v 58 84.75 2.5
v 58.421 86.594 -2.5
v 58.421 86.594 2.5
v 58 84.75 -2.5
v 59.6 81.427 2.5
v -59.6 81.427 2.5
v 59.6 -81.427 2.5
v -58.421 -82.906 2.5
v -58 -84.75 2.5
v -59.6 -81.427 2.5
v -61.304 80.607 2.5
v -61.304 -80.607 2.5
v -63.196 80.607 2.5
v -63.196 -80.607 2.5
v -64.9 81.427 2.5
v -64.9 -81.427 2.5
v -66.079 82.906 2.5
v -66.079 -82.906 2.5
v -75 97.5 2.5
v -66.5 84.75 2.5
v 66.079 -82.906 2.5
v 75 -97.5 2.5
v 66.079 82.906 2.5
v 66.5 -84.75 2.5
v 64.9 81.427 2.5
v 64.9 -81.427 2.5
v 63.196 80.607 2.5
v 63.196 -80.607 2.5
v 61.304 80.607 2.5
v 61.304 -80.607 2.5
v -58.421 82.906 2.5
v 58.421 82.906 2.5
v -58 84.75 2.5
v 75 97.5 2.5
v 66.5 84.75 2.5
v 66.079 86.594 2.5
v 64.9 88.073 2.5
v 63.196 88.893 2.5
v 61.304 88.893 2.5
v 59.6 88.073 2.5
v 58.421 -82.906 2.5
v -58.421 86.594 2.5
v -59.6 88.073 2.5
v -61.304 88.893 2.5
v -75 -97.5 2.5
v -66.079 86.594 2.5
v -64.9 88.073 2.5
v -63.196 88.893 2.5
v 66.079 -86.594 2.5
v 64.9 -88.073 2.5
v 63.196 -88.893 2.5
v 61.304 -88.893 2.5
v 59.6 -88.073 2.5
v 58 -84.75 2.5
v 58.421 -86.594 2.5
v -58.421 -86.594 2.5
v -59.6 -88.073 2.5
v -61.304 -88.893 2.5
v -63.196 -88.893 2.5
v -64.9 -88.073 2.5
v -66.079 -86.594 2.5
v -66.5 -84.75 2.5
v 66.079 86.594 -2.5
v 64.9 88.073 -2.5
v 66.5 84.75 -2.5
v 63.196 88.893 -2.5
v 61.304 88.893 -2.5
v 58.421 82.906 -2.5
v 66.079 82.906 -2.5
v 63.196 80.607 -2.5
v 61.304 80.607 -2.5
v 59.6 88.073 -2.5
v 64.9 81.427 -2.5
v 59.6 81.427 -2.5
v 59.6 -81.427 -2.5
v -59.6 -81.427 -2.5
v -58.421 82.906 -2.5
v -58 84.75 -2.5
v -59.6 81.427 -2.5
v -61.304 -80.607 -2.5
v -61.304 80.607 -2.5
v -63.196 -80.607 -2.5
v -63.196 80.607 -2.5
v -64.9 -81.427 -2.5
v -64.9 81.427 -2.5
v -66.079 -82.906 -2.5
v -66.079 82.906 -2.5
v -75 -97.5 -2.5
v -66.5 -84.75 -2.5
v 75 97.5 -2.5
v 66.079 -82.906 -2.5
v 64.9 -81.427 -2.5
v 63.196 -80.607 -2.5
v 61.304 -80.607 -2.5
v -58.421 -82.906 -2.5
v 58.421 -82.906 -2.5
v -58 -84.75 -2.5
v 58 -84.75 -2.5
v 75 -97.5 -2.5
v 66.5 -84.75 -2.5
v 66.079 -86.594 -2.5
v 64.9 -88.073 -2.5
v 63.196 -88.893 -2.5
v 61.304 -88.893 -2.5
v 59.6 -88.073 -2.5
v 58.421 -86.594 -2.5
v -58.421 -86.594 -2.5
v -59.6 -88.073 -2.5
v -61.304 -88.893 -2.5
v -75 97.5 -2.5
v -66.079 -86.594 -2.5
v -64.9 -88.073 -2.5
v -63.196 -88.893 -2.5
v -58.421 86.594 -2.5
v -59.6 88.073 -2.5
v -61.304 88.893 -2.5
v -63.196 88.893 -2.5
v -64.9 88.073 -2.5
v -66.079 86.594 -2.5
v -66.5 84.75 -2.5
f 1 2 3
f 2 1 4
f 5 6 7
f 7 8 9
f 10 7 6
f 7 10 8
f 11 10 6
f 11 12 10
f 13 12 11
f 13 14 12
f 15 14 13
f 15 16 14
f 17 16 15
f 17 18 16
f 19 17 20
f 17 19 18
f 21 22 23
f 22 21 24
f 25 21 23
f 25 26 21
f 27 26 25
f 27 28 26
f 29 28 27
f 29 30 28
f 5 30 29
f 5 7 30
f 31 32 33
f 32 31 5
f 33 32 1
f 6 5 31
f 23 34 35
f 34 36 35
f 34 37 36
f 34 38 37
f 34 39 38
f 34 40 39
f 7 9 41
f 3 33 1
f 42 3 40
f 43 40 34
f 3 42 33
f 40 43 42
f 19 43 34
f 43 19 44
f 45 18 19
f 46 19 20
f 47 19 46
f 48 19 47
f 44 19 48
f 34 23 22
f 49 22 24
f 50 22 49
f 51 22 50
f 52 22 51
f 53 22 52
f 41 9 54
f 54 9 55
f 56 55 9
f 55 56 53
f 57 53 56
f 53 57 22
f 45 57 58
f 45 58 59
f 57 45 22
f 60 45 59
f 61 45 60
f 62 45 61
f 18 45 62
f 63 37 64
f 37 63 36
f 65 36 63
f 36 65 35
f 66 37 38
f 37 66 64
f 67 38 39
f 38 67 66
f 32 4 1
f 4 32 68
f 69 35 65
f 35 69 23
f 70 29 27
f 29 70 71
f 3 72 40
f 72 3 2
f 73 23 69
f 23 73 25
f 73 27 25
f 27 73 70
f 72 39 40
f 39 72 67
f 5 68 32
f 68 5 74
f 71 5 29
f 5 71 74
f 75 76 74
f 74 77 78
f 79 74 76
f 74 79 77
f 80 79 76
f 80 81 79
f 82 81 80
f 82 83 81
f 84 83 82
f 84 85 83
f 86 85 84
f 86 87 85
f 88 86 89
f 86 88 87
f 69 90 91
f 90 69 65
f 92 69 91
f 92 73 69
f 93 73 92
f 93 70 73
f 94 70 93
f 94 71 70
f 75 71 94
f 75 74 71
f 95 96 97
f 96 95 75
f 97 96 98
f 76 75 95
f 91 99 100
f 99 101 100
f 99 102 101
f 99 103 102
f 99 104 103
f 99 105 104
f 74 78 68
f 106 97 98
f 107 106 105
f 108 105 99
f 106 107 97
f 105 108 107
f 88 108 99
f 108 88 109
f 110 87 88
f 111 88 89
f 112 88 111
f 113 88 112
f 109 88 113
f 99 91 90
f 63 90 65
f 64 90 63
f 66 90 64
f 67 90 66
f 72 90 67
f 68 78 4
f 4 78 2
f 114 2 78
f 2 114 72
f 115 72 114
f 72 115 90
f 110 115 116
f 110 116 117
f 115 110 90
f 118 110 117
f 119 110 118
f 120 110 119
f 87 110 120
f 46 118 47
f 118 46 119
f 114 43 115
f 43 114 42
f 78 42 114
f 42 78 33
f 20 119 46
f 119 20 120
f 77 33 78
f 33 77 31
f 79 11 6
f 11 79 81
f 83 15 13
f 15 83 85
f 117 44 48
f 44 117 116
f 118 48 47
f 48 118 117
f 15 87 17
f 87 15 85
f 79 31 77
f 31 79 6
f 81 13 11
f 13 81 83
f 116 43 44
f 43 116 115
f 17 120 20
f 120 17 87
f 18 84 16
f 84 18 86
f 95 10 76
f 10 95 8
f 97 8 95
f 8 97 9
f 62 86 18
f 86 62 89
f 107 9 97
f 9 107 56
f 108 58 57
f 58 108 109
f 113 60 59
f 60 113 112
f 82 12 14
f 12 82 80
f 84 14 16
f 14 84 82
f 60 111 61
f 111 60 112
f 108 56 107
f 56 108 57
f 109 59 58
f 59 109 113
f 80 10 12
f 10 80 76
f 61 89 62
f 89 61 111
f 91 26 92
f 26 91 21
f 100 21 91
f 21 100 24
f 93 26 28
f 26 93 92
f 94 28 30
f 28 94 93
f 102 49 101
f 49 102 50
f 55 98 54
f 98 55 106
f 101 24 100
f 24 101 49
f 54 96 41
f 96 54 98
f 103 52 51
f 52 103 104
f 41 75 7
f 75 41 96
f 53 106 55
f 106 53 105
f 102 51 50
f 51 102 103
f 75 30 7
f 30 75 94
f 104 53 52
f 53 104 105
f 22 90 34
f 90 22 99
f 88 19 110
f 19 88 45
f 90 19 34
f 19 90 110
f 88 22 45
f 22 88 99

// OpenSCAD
// Generated by SolidPython 1.1.3 on 2023-10-16 12:13:29


difference() {
	cube(center = true, size = [150, 195.0000000000, 5]);
	union() {
		translate(v = [62.2500000000, 84.7500000000]) {
			cylinder(center = true, h = 5, r = 4.2500000000);
		}
		translate(v = [-62.2500000000, 84.7500000000]) {
			cylinder(center = true, h = 5, r = 4.2500000000);
		}
		translate(v = [-62.2500000000, -84.7500000000]) {
			cylinder(center = true, h = 5, r = 4.2500000000);
		}
		translate(v = [62.2500000000, -84.7500000000]) {
			cylinder(center = true, h = 5, r = 4.2500000000);
		}
	}
}
/***********************************************
*********      SolidPython code:      **********
************************************************
 
import solid
import numbers
import pudb
from solid.utils import *
import viewscad
import subprocess
import os
import os.path as osp
import math
import sys

chamfer_extrude=solid.import_scad("./chamfer_extrude.scad")
chamfer_extrude=chamfer_extrude.chamfer_extrude
r = viewscad.Renderer(width=800, height=800)

def debug(model,f_name,path="/home/ts/code/projects/mfd/designs/debug"):
    solid.scad_render_to_file(model,osp.join(path,f_name)+".scad")
#generate position list of wells using offset from center
wells_pos_from_center_4 = lambda offset: [[-offset,offset],
                                        [offset, offset],
                                        [-offset, -offset],
                                        [offset, -offset]]
#wells_pos_from_center_2 = lambda offset: [[0,offset],
#                                        [0, -offset]]
wells_pos_from_center_2 = lambda offset: [[offset,0],
                                        [-offset,0]]

def make_well(dims,shape=None,height=None,dxf=False):
    def circle_cylinder():
        if dxf or (height is None):
            well = solid.circle(r=dims, segments=64)
        else:
            well = solid.cylinder(r=dims, h=height, segments=64, center = True)
        return well
    if dims is None:
        sys.exit("radius needs to be a number")
    if isinstance(dims, numbers.Number):
        well =circle_cylinder()
    elif len(dims)==1:
        if isinstance(dims[1], numbers.Number):
            well =circle_cylinder()
        else:
            sys.exit("radius needs to be a number")
    elif len(dims)==2:
        well = solid.square(dims,center = True)
    elif len(dims)==3:
        well = solid.cube(dims, center = True)
    return well

def wells_top_bottom(center_gap,device_dims=None,shape=None,height=None, positions = None, dxf = False):
    well_shape = make_well(device_dims,shape=shape,height=height,dxf=dxf)
    wells = []
    if positions is None:
        offset = radius+radius/2.0
        positions = wells_pos_from_center_2(offset)
    if dxf or (height is None):
        height = 0
    for position in positions:
        if dxf:
            wells.append(solid.translate([position[0],position[1]])(well_shape))
        else:
            wells.append(solid.translate([position[0],position[1],height/2.0])(well_shape))
    return  union()(*wells)

#place wells in four corners 
def four_corner(radius,height=None, positions = None, dxf = False):
    #if well pos not specified set
    #to equally spaced by half radius
    if positions is None:
        offset = radius+radius/2.0
        positions = wells_pos_from_center_4(offset)
    if dxf or (height is None):
        height = 0
    #make wells at positions with specified radius and height
    wells = []
    for position in positions:
        #make circle if making dxf
        if dxf:
            well_shape = solid.circle(r=radius, segments=64)
            well_shape = solid.translate([position[0],position[1]])(well_shape)
        #if stl make cylinder
        else:
            well_shape = solid.cylinder(r=radius, h=height, segments=64, center = True)
            well_shape = solid.translate([position[0],position[1],height/2.0])(well_shape)
        wells.append(well_shape)
    return  union()(*wells)

#generate channels 
def make_channels(length,width,height=0,num_chans=1,max_chans=None,spacing=None, dxf = False,
                  rotate_channels=False):
    if dxf or (height is None):
        height = 0
    #if channel gap not defined, is equal to
    if spacing is None: spacing = width
    #calculate number of channels if fitting max num within given width
    if not max_chans is None:
        import math
        num_chans = math.floor((max_chans-spacing)/(width+spacing))
    #get total width of channel section  
    total_width = (width*num_chans)+(spacing*(num_chans-1))

    #make template channel
    #if rotate_channels: width, length = length, width
    if dxf:
        channel_t = solid.square([length,width],center = True)
    else:
        channel_t = solid.cube([length,width,height], center = True)

    #if number channels is even, offset the first channel to center its gap
    if num_chans % 2 == 0: centering = -(width/2.0+spacing/2.0)
    else: centering = 0
    #move template channel up to align bottom at z = 0 
    #and offset center if necessary
    if dxf:
        channel_t = solid.translate([0,centering])(channel_t)
    else:
        channel_t = solid.translate([0,centering,height/2.0])(channel_t)

    #if rotate_channels: length,width = width,length
    #start making the channels
    channels = []
    for i in range(num_chans):
        #if i=0 there is no translation
        #if i=1, we make the first channel adjacent to second
        direction = i

        #if i>=1, we add channels alternating left and right
        if i >= 1:
            direction = -(i/2.0)
            if i % 2 == 1: direction = (-direction)+0.5
                
        #make channel at right position and add it to channel list
        translation_coords = [0,direction*(width+spacing)]
        #if rotate_channels: translation_coords = [direction*(width+spacing),0]
        if dxf:
            channel = solid.translate(translation_coords)(channel_t)
        else:
            channel = solid.translate([*translation_coords,0])(channel_t)
        channels.append(channel)
    
    #group all channels as one object
    channels = union()(*channels)
    #compute the x,y,z dimensions in order to pass as arguments 
    #for construction of other parts of device (such as the chambers)
    measurements = {'x':(length/2.0,-length/2.0),
                    'y':(total_width/2.0,-total_width/2.0)}
    if not dxf:
        measurements['z'] = (height,0)
    if rotate_channels:
        channels = solid.rotate(90)(channels)
        measurements['x'],measurements['y']=measurements['y'],measurements['x']
    return channels,measurements

def make_chambers(msrs,height=None,extra=0,len_until=None,width=None, dxf = False):
    #computes x,y,z length
    total = lambda x : abs(x[0]) + abs(x[1])
    
    #if specific height if specified
    #otherwise use same height as channels
    if dxf:
        pass
    elif not height is None:
        msrs['z'] = (height,0)
    else:
        msrs['z'] = (0,0)
        
    #make copy of measurements from channels to modify chamber dimensions 
    #and add length to chambers as specified
    chamber_dims = msrs.copy()
    #calculate length of chamber to reach specified offset
    if not len_until is None:
        chamber_len = len_until-(msrs['x'][0])
    #or add specified length to channel length (if not specified, adds 0)
    else:
        chamber_len = msrs['x'][0]+extra
    #set the chamber length based 
    chamber_dims['x'] = (chamber_len/2.0,-(chamber_len/2.0))
    #compute final dimensions of chamber
    if not width is None:
        chamber_dims['y'] = (width/2.0,-width/2.0)
    chamber_dims = [total(size) for size in chamber_dims.values()]
        
    #calculate chamber translation offset to place adjacent to channels
    chamber_trslt = msrs['x'][0]+(chamber_len/2.0)
    #compute chamber translation coordinates to align with channels
    #x = 1 moves chamber above channels
    #x = -1 moves chamber below channels
    if dxf:
        trslt = lambda x : [x*(chamber_trslt),0]
    else:
        trslt = lambda x : [x*(chamber_trslt),0,msrs['z'][0]/2.0]
    
    #function to make chamber at top or at bottom 
    if dxf:
        move = lambda x : solid.translate(trslt(x))(solid.square(chamber_dims, center = True) )
    else:
        move = lambda x : solid.translate(trslt(x))(solid.cube(chamber_dims,center = True))
    #make top and bottom chambers and return them as grouped
    top = move(1)
    bottom = move(-1)
    #chambers=solid.rotate(90)(solid.union()(top,bottom))
    chambers=(solid.union()(top,bottom))

    return chambers

#create alignment features 
def alignment_features(unit,dims,grid_size, mask_size = None, alignment = "hollow", units_from_center = (2.5,2.5), corner_len=None):
    width = grid_size[0]*dims[0]
    length = grid_size[1]*dims[1]
    if mask_size is None and corner_len is None:
        corner_len = (dims[0] + dims[1]) /2 / 8
    corner = lambda thickness_div : solid.union()( solid.square([corner_len,corner_len/thickness_div],center=False), solid.square([corner_len/thickness_div,corner_len],center=False) )
    
    def make_full(thickness_div):
        thickness = corner_len/thickness_div
        tr = solid.translate([0, 0, 0 ])(solid.rotate(180)(corner(thickness_div)))
        tr = solid.translate([thickness/2,thickness/2,0])(tr)
        bl = solid.translate([0, 0, 0 ])(solid.rotate(0)(corner(thickness_div)))
        bl = solid.translate([-thickness/2,-thickness/2,0])(bl)
        return solid.union()(tr,bl)
    
    def make_hollow(thickness_div):
        thickness = corner_len/(thickness_div/2)
        inner = make_full(thickness_div)
        outer = make_full(thickness_div/2)
        hollow = outer - inner 
        return hollow
    
    center = (width /2 , length/2)
    mask_pos = lambda x,y : (center[0] + x*(float(units_from_center[0])*dims[0]), center[1] + y*(float(units_from_center[1])*dims[1]))
    positions = []
    positions.append(mask_pos(1,0))
    positions.append(mask_pos(0,1))
    positions.append(mask_pos(-1,0))
    positions.append(mask_pos(0,-1))
    make_mask = lambda mtype : make_hollow(8) if mtype == "hollow" else make_full(8)
    masks = [ solid.translate([*position,0])(make_mask(alignment)) for position in positions]
    
    solid.scad_render_to_file(solid.union()(*masks),"./designs/open_chamber/masks.scad")
    #return unit - solid.union()(*masks)
    return solid.union()(*masks,unit)

def create_outline(thickness, array, dims, grid_size,):
    width = grid_size[0]*dims[0] + thickness *2
    length = grid_size[1]*dims[1] + thickness *2
    outer = solid.translate([-thickness, -thickness,0])(solid.square([width, length]))
    return outer-array

def create_wall(wall_thickness, outline_thickness, dims, grid_size, wall_height = 2000, dxf = False):
    inner_width = grid_size[0]*dims[0] + outline_thickness *2
    inner_length = grid_size[1]*dims[1] + outline_thickness *2
    outer_width = inner_width + wall_thickness * 2
    outer_length = inner_length + wall_thickness * 2
    outer_pos_x = -outline_thickness-wall_thickness
    outer_pos_y = -outline_thickness-wall_thickness
    inner_pos_x = -outline_thickness
    inner_pos_y = -outline_thickness
    if dxf:
        inner_wall = solid.translate([inner_pos_x,
                                      inner_pos_y,
                                      0])(solid.square([inner_width, inner_length]))
        outer_wall = solid.translate([outer_pos_x,
                                      outer_pos_y,
                                      0])(solid.square([outer_width, outer_length]))

        return outer_wall-inner_wall
    else:
        inner_wall = solid.translate([inner_pos_x,
                                      inner_pos_y,
                                      0])(solid.cube([inner_width, inner_length,wall_height]))
        outer_wall = solid.translate([outer_pos_x,
                                      outer_pos_y,
                                      0])(solid.cube([outer_width, outer_length,wall_height]))

        return outer_wall-inner_wall, {'wall_height': wall_height,
                                       'wall_thickness': wall_thickness,
                                       'inner_width':inner_width,
                                       'inner_length': inner_length,
                                       'outer_width': outer_width,
                                       'outer_length': outer_length,
                                       'outer_pos_x' : outer_pos_x,
                                       'outer_pos_y' : outer_pos_y,
                                       'inner_pos_x' : inner_pos_x,
                                       'inner_pos_y' : inner_pos_y}

def create_thicker_wall(wall_thickness, outer_wall_offset, wall_dims, dims, grid_size, height_start = .2, height_end=2, dxf = False):
    addon_wall,thicker_wall_dims = create_wall(wall_thickness, outer_wall_offset, dims, grid_size, wall_height=height_end-height_start, dxf = False)
    addon_wall = solid.translate([0,0,height_start])(addon_wall)

    thicker_wall_dims['wall_height'] = height_end
    thicker_wall_dims['wall_thickness'] = wall_dims['wall_thickness'] + wall_thickness
    return addon_wall, thicker_wall_dims
 
def add_lock_to_wall(wall,wall_dims,y_offset = 0,cut_ratio=0.7,L_length=3, gap_ratio=0.05, axis="x",width_ratio=1/2):
    # Makes L shape
    def make_L(max_length,length_thickness,max_width,width_thickness,height,y_offset):
        length = solid.cube([max_length,length_thickness,height])
        width = solid.cube([width_thickness,max_width,height])
        width = solid.translate([max_length-(width_thickness),0,0])(width)
        L = solid.union()(width,length)
        debug(L,"L")
        if axis == "x":
            L = solid.rotate(-90)(L)
            L = solid.translate([0,max_length,0])(L)
        else:
            L = solid.rotate(-180)(L)
            L = solid.translate([max_length,max_width,0])(L)
        return solid.translate([0,0,y_offset])(L)
    
    lock_length = L_length
    lock_width = wall_dims['wall_thickness']*width_ratio
    lock_length_thickness = lock_width/2
    lock_width_thickness = lock_width/2
    L_lock = make_L(lock_length,lock_length_thickness,lock_width,lock_width_thickness, wall_dims['wall_height']-y_offset, y_offset)
    
    margin_space = lock_length - lock_length*(1-gap_ratio)
    key_length = lock_length-margin_space
    key_length_thickness = lock_length_thickness-(margin_space*2)
    key_width = lock_width-(margin_space*2)
    key_width_thickness = lock_width_thickness-(margin_space*2)
    L_key = make_L(key_length,key_length_thickness,key_width,key_width_thickness, wall_dims['wall_height']-y_offset, y_offset)
    L_key = solid.translate([margin_space,margin_space,0])(L_key)
    L = solid.union()(L_lock,L_key)
    debug(L,"L")
    
    #Make cube to be used as negative to split frame in a half
    #Can choose if making left or right negative, specify ratio of split
    def make_negative(right,cut_ratio):
        if axis == "x":
            if right:
                length = wall_dims['outer_length']*(1-cut_ratio)
                pos_x = wall_dims['outer_pos_x']+(wall_dims['outer_length']*cut_ratio)
            else:
                length = wall_dims['outer_length']*(cut_ratio)
                pos_x = wall_dims['outer_pos_x'] 
            negative = solid.cube([wall_dims['outer_width'],length, wall_dims['wall_height']])
            negative = solid.translate([wall_dims['outer_pos_y'],pos_x,0])(negative)
        else:
            if right:
                length = wall_dims['outer_width']*(1-cut_ratio)
                pos_x = wall_dims['outer_pos_y']+(wall_dims['outer_width']*cut_ratio)
            else:
                length = wall_dims['outer_width']*(cut_ratio)
                pos_x = wall_dims['outer_pos_y'] 
            negative = solid.cube([length,wall_dims['outer_length'], wall_dims['wall_height']])
            negative = solid.translate([pos_x,wall_dims['outer_pos_x'],0])(negative)
        return negative, pos_x, length 
                      
    #Make negatives
    negative_right, right_half_pos_x, right_half_length = make_negative(True,cut_ratio)
    negative_left, left_half_pos_x, right_half_length = make_negative(False,cut_ratio)
    #Make halves
    left_half = solid.difference()(wall,negative_right)
    right_half = solid.difference()(wall,negative_left)
    def place_L(L, L_length,L_width):
        #Place L on top wall       
        offset_to_center = (wall_dims['wall_thickness']-L_width)/2
        if axis == "x":
            y_pos_top = (wall_dims['outer_pos_y'] +
                    wall_dims['outer_width'] - 
                    L_width - offset_to_center)
            top_L = solid.translate([y_pos_top,
                                     right_half_pos_x-(L_length),
                                     0])(L)
            #Place L on bottom wall       
            y_pos_bottom = wall_dims['outer_pos_y']+offset_to_center
            bottom_L = solid.translate([y_pos_bottom,
                                        right_half_pos_x-L_length,
                                        0])(L)
        else:
            y_pos_top = (wall_dims['outer_pos_x'] +
                    wall_dims['outer_length'] -
                    (L_width+offset_to_center))
            top_L = solid.translate([right_half_pos_x-L_length,
                                     y_pos_top,
                                     0])(L)
            #Place L on bottom wall       
            y_pos_bottom = wall_dims['outer_pos_y']+offset_to_center
            bottom_L = solid.translate([right_half_pos_x-L_length,
                                        y_pos_bottom,
                                        0])(L)
        return bottom_L, top_L
    #Make complimentary L pieces through union and differences
    #Make Lock
    bottom_L_lock, top_L_lock = place_L(L_lock,L_length,lock_width)
    left_half = solid.difference()(left_half,bottom_L_lock)
    left_half = solid.difference()(left_half,top_L_lock)
    #Make Key
    bottom_L_key, top_L_key = place_L(L_key,L_length,lock_width)
    right_half = solid.union()(right_half,bottom_L_key)
    right_half = solid.union()(right_half,top_L_key)
    return left_half, right_half


#build a row x col grid of containment units
def make_unit_array(unit,dims,grid_size, dxf = False, alignment = None, mask_size = None,
                    units_from_center = None,alignment_offset=None, alignment_mark_size=1):
    units = []
    for col in range(grid_size[1]):
        for row in range(grid_size[0]):
            if dxf:
                units.append(solid.translate([row*dims[0],col*dims[1]])(unit))
            else:
                units.append(solid.translate([row*dims[0],col*dims[1],dims[2]/2.0])(unit))
    array = solid.union()(*units)
    if (not alignment is None) and dxf:
        if not alignment_offset is None:
            array = solid.translate([alignment_offset[0],alignment_offset[1]])(array)
        array = alignment_features(array,dims, grid_size, alignment = alignment, mask_size = None, units_from_center = units_from_center,corner_len=alignment_mark_size)
        if not alignment_offset is None:
            array = solid.translate([-alignment_offset[0],-alignment_offset[1]])(array)
    return array


def make_taylor(wells_pos = wells_pos_from_center_4(2.25), well_rad = 1.5 ,
                well_height = 2, chan_w = 0.01, chan_l = 1, chan_h = 0.010 ,
                chan_gap = 0.040, max_chans = None,num_chans=100, chamber_height  = 0.100,
                columns = 1, rows = 1, chamber_len_until=2.25, add_channels = True, add_wells = True, 
                add_chambers = True, save_path = "./", alignment = None, units_from_center = 2,
                mask_size = None, render_stl = False, outline_thickness = 0.050, dxf = True,
                wall_height = 15, wall_thickness = 0.95, casing_x=9, casing_y=9, casing_z=0,rotate_units=0):

    dims = [casing_x, casing_y, casing_z]
    wells = four_corner(well_rad,well_height, dxf = dxf, positions = wells_pos)
    debug(wells,"wells")
    channels, msrs = make_channels(chan_l,chan_w,chan_h,dxf=dxf, spacing = chan_gap, max_chans=max_chans,num_chans=num_chans)
    debug(channels,"channels")
    chambers = make_chambers(msrs,dxf = dxf, height=chamber_height,len_until=chamber_len_until)
    debug(chambers,"chambers")

    #add together and render
    device_parts = []
    if add_channels:
        device_parts.append(channels)
    if add_wells:
        device_parts.append(wells)
    if add_chambers:
        device_parts.append(chambers)
    device=union()(*device_parts)
    device = rotate(rotate_units)(device)

    device=solid.translate([dims[0]/2.0,dims[1]/2.0,0])(device)
    channels = rotate(rotate_units)(channels)
    channels=solid.translate([dims[0]/2,dims[1]/2,0])(channels)
    chambers_wells = union()(wells,chambers)
    chambers_wells = rotate(rotate_units)(chambers_wells)
    chambers_wells=solid.translate([dims[0]/2,dims[1]/2,0])(chambers_wells)

    file_name = str(rows)+'x'+str(columns)+'_units_'
    grid_size = [rows,columns]

    if alignment:
        alignment="full"
    device = make_unit_array(device,dims,grid_size, dxf=dxf, alignment = alignment,
                                 units_from_center = units_from_center)
    channels = make_unit_array(channels,dims,grid_size, dxf=dxf, alignment = alignment,
                                 units_from_center = units_from_center)
    if alignment=="full":
        alignment="hollow"

    chambers_wells = make_unit_array(chambers_wells,dims,grid_size, dxf=dxf, alignment = alignment,
                                 units_from_center =units_from_center)

    def save_model(model,prefix):
        model_fname = os.path.abspath(save_path+prefix+"_"+file_name+".scad")
        solid.scad_render_to_file(model,model_fname)
        return model_fname

    wells_fname = save_model(wells,"wells")
    channels_fname = save_model(channels,"channels")
    device_fname = save_model(device,"device")
    chambers_wells_fname = save_model(chambers_wells,"chambers_wells")
    return (chambers_wells,chambers_wells_fname), (channels,channels_fname), (device,device_fname)

def make_device(design='open',rows=8,columns=6,wells_pos = 4.5,well_offset=3.2, well_rad=3.2,well_height=0.1,
                chan_l=1,chan_w=0.01,chan_h=0.01,chan_gap=0.015,num_chans=101,dxf=True,save_path="./designs/open_chamber/",
                casing_x=9.0,casing_y=18.0,casing_z=0,rotate_units=90,units_from_center=(3,1),chamber_len_until=4.5,
                chamber_width=None,alignment=True, add_wells=True, add_channels=True,add_chambers=True):

    dims = [casing_x, casing_y, casing_z]
    if design == "open":
        wells_pos=wells_pos_from_center_2(wells_pos)
        wells = wells_top_bottom(well_offset*2,device_dims=well_rad,height=well_height, dxf = dxf, positions = wells_pos)
    elif design == "closed":
        wells_pos=wells_pos_from_center_4(wells_pos)
        debug(wells,"wells")
        wells = four_corner(well_offset,well_heightdevice_dims=well_rad, dxf = dxf, positions = wells_pos)
    else:
        print(design+" is not a valid design.\n Choose valid design: 'open' or 'closed'")
        exit()
    wells = rotate(rotate_units)(wells)
    wells=solid.translate([dims[0]/2,dims[1]/2,0])(wells)
    debug(wells,"wells")

    channels, msrs = make_channels(chan_l,chan_w,chan_h,dxf=dxf, spacing = chan_gap, num_chans=num_chans,rotate_channels=False)
    channels = rotate(rotate_units)(channels)
    channels=solid.translate([dims[0]/2,dims[1]/2,0])(channels)

    chambers=make_chambers(msrs,height=None,extra=0,len_until=chamber_len_until, width=chamber_width,dxf = dxf)
    chambers = rotate(rotate_units)(chambers)
    chambers=solid.translate([dims[0]/2,dims[1]/2,0])(chambers)

    device_parts = []
    if add_channels:
        device_parts.append(channels)
    if add_wells:
        device_parts.append(wells)
    if add_chambers:
        device_parts.append(chambers)
    device = union()(*device_parts)
    #device = rotate(rotate_units)(device)
    #device=solid.translate([dims[0]/2.0,dims[1]/2.0,0])(device)

    chambers_wells = []
    if add_chambers:
        chambers_wells.append(chambers)
    if add_wells:
        chambers_wells.append(wells)
    chambers_wells = union()(*chambers_wells)
    #chambers_wells = union()(wells,chambers)
    #chambers_wells = rotate(rotate_units)(chambers_wells)
    #chambers_wells=solid.translate([dims[0]/2,dims[1]/2,0])(chambers_wells)

    file_name = str(rows)+'x'+str(columns)+'_units_'

    grid_size = [rows,columns]
    if alignment:
        alignment="full"
    device = make_unit_array(device,dims,grid_size, dxf=dxf, alignment = alignment,
                                 units_from_center = units_from_center)
    channels = make_unit_array(channels,dims,grid_size, dxf=dxf, alignment = alignment,
                                 units_from_center = units_from_center)
    if alignment=="full":
        alignment="hollow"

    chambers_wells = make_unit_array(chambers_wells,dims,grid_size, dxf=dxf, alignment = alignment,
                                 units_from_center =units_from_center)

    def save_model(model,prefix):
        model_fname = os.path.abspath(save_path+prefix+"_"+file_name+".scad")
        solid.scad_render_to_file(model,model_fname)
        return model_fname

    wells_fname = save_model(wells,"wells")
    channels_fname = save_model(channels,"channels")
    device_fname = save_model(device,"device")
    chambers_wells_fname = save_model(chambers_wells,"chambers_wells")
    return (chambers_wells,chambers_wells_fname), (channels,channels_fname), (device,device_fname)


def make_open_chamber(rows=8,columns=6,wells_pos = wells_pos_from_center_2(4.5), well_rad=3.2,well_height=0.1,
                      chan_l=1,chan_w=0.01,chan_h=0.01,chan_gap=0.015,num_chans=101,dxf=True,save_path="./designs/open_chamber/",
                      casing_x=9.0,casing_y=18.0,casing_z=0,rotate_units=90,units_from_center=(3,1),chamber_len_until=4.5,
                      chamber_width=None,alignment=True, add_wells=True, add_channels=True,add_chambers=True):

    dims = [casing_x, casing_y, casing_z]
    wells = wells_top_bottom(well_rad,height=well_height, dxf = dxf, positions = wells_pos)
    channels, msrs = make_channels(chan_l,chan_w,chan_h,dxf=dxf, spacing = chan_gap, num_chans=num_chans,rotate_channels=False)
    chambers=make_chambers(msrs,height=None,extra=0,len_until=chamber_len_until, width=chamber_width,dxf = dxf)
    debug(chambers,"chambers")
    device_parts = []
    if add_channels:
        device_parts.append(channels)
    if add_wells:
        device_parts.append(wells)
    if add_chambers:
        device_parts.append(chambers)
    device = union()(*device_parts)
    device = rotate(rotate_units)(device)
    device=solid.translate([dims[0]/2.0,dims[1]/2.0,0])(device)
    channels = rotate(rotate_units)(channels)
    channels=solid.translate([dims[0]/2,dims[1]/2,0])(channels)
    chambers_wells = union()(wells,chambers)
    chambers_wells = rotate(rotate_units)(chambers_wells)
    chambers_wells=solid.translate([dims[0]/2,dims[1]/2,0])(chambers_wells)

    file_name = str(rows)+'x'+str(columns)+'_units_'

    grid_size = [rows,columns]
    if alignment:
        alignment="full"
    device = make_unit_array(device,dims,grid_size, dxf=dxf, alignment = alignment,
                                 units_from_center = units_from_center)
    channels = make_unit_array(channels,dims,grid_size, dxf=dxf, alignment = alignment,
                                 units_from_center = units_from_center)
    if alignment=="full":
        alignment="hollow"

    chambers_wells = make_unit_array(chambers_wells,dims,grid_size, dxf=dxf, alignment = alignment,
                                 units_from_center =units_from_center)

    def save_model(model,prefix):
        model_fname = os.path.abspath(save_path+prefix+"_"+file_name+".scad")
        solid.scad_render_to_file(model,model_fname)
        return model_fname

    wells_fname = save_model(wells,"wells")
    channels_fname = save_model(channels,"channels")
    device_fname = save_model(device,"device")
    chambers_wells_fname = save_model(chambers_wells,"chambers_wells")
    return (chambers_wells,chambers_wells_fname), (channels,channels_fname), (device,device_fname)

def to_dxf(scad_path):
    dxf_path = scad_path.replace(".scad",".dxf")
    subprocess.call(["openscad", "-o", dxf_path, scad_path])
    import ezdxf
    temp_dxf = ezdxf.readfile(dxf_path)
    temp_dxf.saveas(dxf_path)

#def make_walls(diameter,thickness,grid_size,dims,height=20,segments=256,make_inner=True):
#    wafer_wall_out = solid.cylinder(r=diameter/2,h=height, segments=segments)
#    wafer_wall_in = solid.cylinder(r=(diameter/2-thickness),h=height, segments=segments)
#    wafer_wall = solid.difference()(wafer_wall_out,wafer_wall_in)
#    wafer_wall = solid.translate([grid_size[1]*dims[1]/2.0,grid_size[0]*dims[0]/2.0])(wafer_wall)
#
#    vertical_wall_length = grid_size[1]*dims[1]
#    horizontal_wall_length = grid_size[0]*dims[0]
#    vertical_wall = solid.cube([vertical_wall_length,thickness,height],center = True)
#    vertical_wall = solid.translate([vertical_wall_length/2,0,height/2])(vertical_wall)
#    horizontal_wall = solid.cube([thickness,horizontal_wall_length,height],center = True)
#    horizontal_wall = solid.translate([0,vertical_wall_length/2,height/2])(horizontal_wall)
#    walls = []
#    walls.append(horizontal_wall)
#    walls.append(vertical_wall)
#    for col in range(grid_size[1]):
#        if col == grid_size[1]-1: 
#            walls.append(solid.translate([0,(col+1)*dims[1]])(vertical_wall))
#        elif col > 0 and col < grid_size[1]-1 and make_inner==True:
#            walls.append(solid.translate([0,(col+1)*dims[1]])(vertical_wall))
#    for row in range(grid_size[0]):
#        if row == grid_size[0]-1: 
#            walls.append(solid.translate([(row+1)*dims[0],0])(horizontal_wall))
#        elif row > 0 and row < grid_size[0]-1 and make_inner==True:
#            walls.append(solid.translate([(row+1)*dims[0],0])(horizontal_wall))
#    walls = union()(*walls)
#    wafer_walls = union()(walls,wafer_wall)
#    return walls,wafer_wall,wafer_walls

def make_walls(diameter,thickness,grid_size,dims,height=20,segments=256,make_inner=True,padx=0,pady=0):
    wafer_wall_out = solid.cylinder(r=diameter/2,h=height, segments=segments)
    wafer_wall_in = solid.cylinder(r=(diameter/2-thickness),h=height, segments=segments)
    wafer_wall = solid.difference()(wafer_wall_out,wafer_wall_in)
    wafer_wall = solid.translate([grid_size[1]*dims[1]/2.0,grid_size[0]*dims[0]/2.0])(wafer_wall)

    vertical_wall_length = grid_size[0]*dims[0]+padx
    horizontal_wall_length = grid_size[1]*dims[1]+pady
    vertical_wall = solid.cube([vertical_wall_length,thickness,height],center = True)
    vertical_wall = solid.translate([vertical_wall_length/2-pady/2,-padx/2,height/2])(vertical_wall)
    horizontal_wall = solid.cube([thickness,horizontal_wall_length,height],center = True)
    horizontal_wall = solid.translate([-pady/2,horizontal_wall_length/2-padx/2,height/2])(horizontal_wall)
    walls = []
    walls.append(horizontal_wall)
    walls.append(vertical_wall)
    for col in range(grid_size[1]):
        if col == grid_size[1]-1: 
            walls.append(solid.translate([0,(col+1)*dims[1]+pady])(vertical_wall))
        elif col > 0 and col < grid_size[1]-1 and make_inner==True:
            walls.append(solid.translate([0,(col+1)*dims[1]])(vertical_wall))
    for row in range(grid_size[0]):
        if row == grid_size[0]-1: 
            walls.append(solid.translate([(row+1)*dims[0]+padx,0])(horizontal_wall))
        elif row > 0 and row < grid_size[0]-1 and make_inner==True:
            walls.append(solid.translate([(row+1)*dims[0],0])(horizontal_wall))
    walls = union()(*walls)
    wafer_walls = union()(walls,wafer_wall)
    return walls,wafer_wall,wafer_walls

def save_model(model,base_path,base_name,dxf=True):
    if not os.path.exists(base_path):
        os.makedirs(base_path)
    dxf_path=osp.join(base_path,base_name+".scad")
    solid.scad_render_to_file(model,osp.join(dxf_path))
    if dxf:
        to_dxf(dxf_path)

def make_wafer(diameter,flat_len,thickness):
    wafer = solid.cylinder(r1=diameter/2,r2=diameter/2,h=thickness,segments=512,)()
    x_start_flat=(flat_len/2)
    y_start_flat = math.sqrt(((diameter/2)**2) - (x_start_flat**2) )
    height_delete_flat=diameter/2-y_start_flat
    flat_delete = solid.cube([flat_len,height_delete_flat,thickness],center=False)()
    flat_delete = solid.translate([-flat_len/2,y_start_flat,0])(flat_delete)
    wafer = solid.difference()(wafer,flat_delete)
    wafer = solid.rotate(90)(wafer)
    return wafer

def add_wafer_to_mask(wafer_size,flat_len,mask,grid_size,dims,wafer_line_thickness=0.1,outer_mask_thickness=5,alignment_offset=None):
    def make_wafer_mask(wafer_size,flat_len):
        wafer_mask = make_wafer(wafer_size,flat_len,1)
        wafer_mask = solid.projection()(wafer_mask)
        wafer_mask = solid.translate([grid_size[0]*dims[0]/2.0,grid_size[1]*dims[1]/2.0])(wafer_mask)
        if not alignment_offset is None:
            wafer_mask = solid.translate([-alignment_offset[0],-alignment_offset[1]])(wafer_mask)
        return wafer_mask

    inner_wafer_line_mask = make_wafer_mask(wafer_size-wafer_line_thickness/2,flat_len)
    outer_wafer_line_mask = make_wafer_mask(wafer_size+wafer_line_thickness/2,flat_len)
    outer_wafer_mask = make_wafer_mask(wafer_size+outer_mask_thickness,flat_len)
    outer_wafer_mask = solid.difference()(outer_wafer_mask,outer_wafer_line_mask)
    wafer_mask = solid.union()(outer_wafer_mask,inner_wafer_line_mask)

    return solid.difference()(wafer_mask,mask)

def make_posts(post_shape,post_height):
    posts = solid.linear_extrude(height=post_height)(post_shape)
    return posts

def make_wafer_empty(diameter,flat_len,thickness,margin,notch_len=20,notch_height=5,oversize=1.01):
    diameter*=oversize
    flat_len*=oversize
    wafer = make_wafer(diameter,flat_len,thickness)
    holder = solid.cylinder(r1=diameter/2+margin,r2=diameter/2+margin,h=thickness,segments=512)()
    holder = solid.difference()(holder,wafer)

    x_start_flat=(flat_len/2)
    y_start_flat = math.sqrt(((diameter/2)**2) - (x_start_flat**2) )
    height_delete_flat=diameter/2-y_start_flat
    notch = solid.cube([notch_len,notch_height,thickness],center=False)()
    notch = solid.translate([-notch_len/2,y_start_flat,0])(notch)
    notch = solid.rotate(90)(notch)
    return solid.difference()(holder,notch)

def wafer_print_calibration(diameter,thickness,height,z_offset):
    circles = []
    radii = []
    radii.append(diameter/2.0*0.8)
    radii.append(diameter/2.0*0.6)
    radii.append(diameter/2.0*0.4)
    radii.append(diameter/2.0*0.2)
    for radius in radii:
        inner = solid.cylinder(r1=radius-(thickness/2.0),r2=radius-(thickness/2.0),h=thickness,segments=512,)()
        outer = solid.cylinder(r1=radius+(thickness/2.0),r2=radius+(thickness/2.0),h=thickness,segments=512,)()
        diff = solid.difference()(outer,inner)
        circles.append(diff)
    circles = solid.union()(*circles)
    circles = solid.translate([0,0,z_offset])(circles)
    return circles

def make_rack(wells,dims,grid_size,alignment_offset,rack_x,rack_y,rack_thickness,bolt_width,add_bolts=True):

    #get X and Y dimensions of gride of pipette tips
    X_len = dims[0]*grid_size[0]
    Y_len = dims[1]*grid_size[1]
    #make rack
    rack = solid.cube([rack_x,rack_y,rack_thickness],center=True)

    if add_bolts:
    #add bolt holes
        bolt_hole=solid.cylinder(r=bolt_width/2,h=rack_thickness,center=True)()
        bolt_holes = []
        bolt_holes.append(solid.translate([rack_x/2-1.5*bolt_width,rack_y/2-1.5*bolt_width])(bolt_hole))
        bolt_holes.append(solid.translate([-rack_x/2+1.5*bolt_width,rack_y/2-1.5*bolt_width])(bolt_hole))
        bolt_holes.append(solid.translate([-rack_x/2+1.5*bolt_width,-rack_y/2+1.5*bolt_width])(bolt_hole))
        bolt_holes.append(solid.translate([rack_x/2-1.5*bolt_width,-rack_y/2+1.5*bolt_width])(bolt_hole))
        bolt_holes = solid.union()(*bolt_holes)
        rack=solid.difference()(rack,bolt_holes)
    rack_support = rack

    #center rack with pipette holes
    rack = solid.translate([0,0,rack_thickness/2])(rack)
    rack = solid.translate([X_len/2,Y_len/2])(rack)
    rack = solid.translate([-alignment_offset[0],-alignment_offset[1]])(rack)
    wells = solid.linear_extrude(height=rack_thickness)(wells)
    rack = solid.difference()(rack,wells)
    return rack, rack_support

def make_pillar(wells,dims,grid_size,alignment_offset,rack_x,rack_y,pillar_height,rack_thickness,bolt_width,add_bolts=True,taper_angle=1,bolt_position_corner=1.5):

    #get X and Y dimensions of gride of pipette tips
    X_len = dims[0]*grid_size[0]
    Y_len = dims[1]*grid_size[1]
    #make rack
    rack = solid.cube([rack_x,rack_y,rack_thickness],center=True)
    
    if add_bolts:
    #add bolt holes
        bolt_hole=solid.cylinder(r=bolt_width/2,h=rack_thickness,center=True)()
        bolt_holes = []
        bolt_holes.append(solid.translate([rack_x/2-bolt_position_corner*bolt_width,rack_y/2-bolt_position_corner*bolt_width])(bolt_hole))
        bolt_holes.append(solid.translate([-rack_x/2+bolt_position_corner*bolt_width,rack_y/2-bolt_position_corner*bolt_width])(bolt_hole))
        bolt_holes.append(solid.translate([-rack_x/2+bolt_position_corner*bolt_width,-rack_y/2+bolt_position_corner*bolt_width])(bolt_hole))
        bolt_holes.append(solid.translate([rack_x/2-bolt_position_corner*bolt_width,-rack_y/2+bolt_position_corner*bolt_width])(bolt_hole))
        bolt_holes = solid.union()(*bolt_holes)
        rack=solid.difference()(rack,bolt_holes)
    rack_support = rack

    #center rack with pipette holes
    #rack = solid.translate([0,0,-rack_thickness])(rack)
    rack = solid.translate([X_len/2,Y_len/2])(rack)
    rack = solid.translate([-alignment_offset[0],-alignment_offset[1]])(rack)
    if not taper_angle == 0:
        wells=chamfer_extrude(pillar_height,taper_angle,segments=20)(wells)
    else:
        wells = solid.linear_extrude(height=pillar_height)(wells)
    rack = solid.union()(rack,wells)
    return rack, rack_support

def deg_taper_len(height,deg):
    if not deg == 0:
        return height*math.tan(math.radians(deg))
    else:
        return 0









 
 
************************************************/
